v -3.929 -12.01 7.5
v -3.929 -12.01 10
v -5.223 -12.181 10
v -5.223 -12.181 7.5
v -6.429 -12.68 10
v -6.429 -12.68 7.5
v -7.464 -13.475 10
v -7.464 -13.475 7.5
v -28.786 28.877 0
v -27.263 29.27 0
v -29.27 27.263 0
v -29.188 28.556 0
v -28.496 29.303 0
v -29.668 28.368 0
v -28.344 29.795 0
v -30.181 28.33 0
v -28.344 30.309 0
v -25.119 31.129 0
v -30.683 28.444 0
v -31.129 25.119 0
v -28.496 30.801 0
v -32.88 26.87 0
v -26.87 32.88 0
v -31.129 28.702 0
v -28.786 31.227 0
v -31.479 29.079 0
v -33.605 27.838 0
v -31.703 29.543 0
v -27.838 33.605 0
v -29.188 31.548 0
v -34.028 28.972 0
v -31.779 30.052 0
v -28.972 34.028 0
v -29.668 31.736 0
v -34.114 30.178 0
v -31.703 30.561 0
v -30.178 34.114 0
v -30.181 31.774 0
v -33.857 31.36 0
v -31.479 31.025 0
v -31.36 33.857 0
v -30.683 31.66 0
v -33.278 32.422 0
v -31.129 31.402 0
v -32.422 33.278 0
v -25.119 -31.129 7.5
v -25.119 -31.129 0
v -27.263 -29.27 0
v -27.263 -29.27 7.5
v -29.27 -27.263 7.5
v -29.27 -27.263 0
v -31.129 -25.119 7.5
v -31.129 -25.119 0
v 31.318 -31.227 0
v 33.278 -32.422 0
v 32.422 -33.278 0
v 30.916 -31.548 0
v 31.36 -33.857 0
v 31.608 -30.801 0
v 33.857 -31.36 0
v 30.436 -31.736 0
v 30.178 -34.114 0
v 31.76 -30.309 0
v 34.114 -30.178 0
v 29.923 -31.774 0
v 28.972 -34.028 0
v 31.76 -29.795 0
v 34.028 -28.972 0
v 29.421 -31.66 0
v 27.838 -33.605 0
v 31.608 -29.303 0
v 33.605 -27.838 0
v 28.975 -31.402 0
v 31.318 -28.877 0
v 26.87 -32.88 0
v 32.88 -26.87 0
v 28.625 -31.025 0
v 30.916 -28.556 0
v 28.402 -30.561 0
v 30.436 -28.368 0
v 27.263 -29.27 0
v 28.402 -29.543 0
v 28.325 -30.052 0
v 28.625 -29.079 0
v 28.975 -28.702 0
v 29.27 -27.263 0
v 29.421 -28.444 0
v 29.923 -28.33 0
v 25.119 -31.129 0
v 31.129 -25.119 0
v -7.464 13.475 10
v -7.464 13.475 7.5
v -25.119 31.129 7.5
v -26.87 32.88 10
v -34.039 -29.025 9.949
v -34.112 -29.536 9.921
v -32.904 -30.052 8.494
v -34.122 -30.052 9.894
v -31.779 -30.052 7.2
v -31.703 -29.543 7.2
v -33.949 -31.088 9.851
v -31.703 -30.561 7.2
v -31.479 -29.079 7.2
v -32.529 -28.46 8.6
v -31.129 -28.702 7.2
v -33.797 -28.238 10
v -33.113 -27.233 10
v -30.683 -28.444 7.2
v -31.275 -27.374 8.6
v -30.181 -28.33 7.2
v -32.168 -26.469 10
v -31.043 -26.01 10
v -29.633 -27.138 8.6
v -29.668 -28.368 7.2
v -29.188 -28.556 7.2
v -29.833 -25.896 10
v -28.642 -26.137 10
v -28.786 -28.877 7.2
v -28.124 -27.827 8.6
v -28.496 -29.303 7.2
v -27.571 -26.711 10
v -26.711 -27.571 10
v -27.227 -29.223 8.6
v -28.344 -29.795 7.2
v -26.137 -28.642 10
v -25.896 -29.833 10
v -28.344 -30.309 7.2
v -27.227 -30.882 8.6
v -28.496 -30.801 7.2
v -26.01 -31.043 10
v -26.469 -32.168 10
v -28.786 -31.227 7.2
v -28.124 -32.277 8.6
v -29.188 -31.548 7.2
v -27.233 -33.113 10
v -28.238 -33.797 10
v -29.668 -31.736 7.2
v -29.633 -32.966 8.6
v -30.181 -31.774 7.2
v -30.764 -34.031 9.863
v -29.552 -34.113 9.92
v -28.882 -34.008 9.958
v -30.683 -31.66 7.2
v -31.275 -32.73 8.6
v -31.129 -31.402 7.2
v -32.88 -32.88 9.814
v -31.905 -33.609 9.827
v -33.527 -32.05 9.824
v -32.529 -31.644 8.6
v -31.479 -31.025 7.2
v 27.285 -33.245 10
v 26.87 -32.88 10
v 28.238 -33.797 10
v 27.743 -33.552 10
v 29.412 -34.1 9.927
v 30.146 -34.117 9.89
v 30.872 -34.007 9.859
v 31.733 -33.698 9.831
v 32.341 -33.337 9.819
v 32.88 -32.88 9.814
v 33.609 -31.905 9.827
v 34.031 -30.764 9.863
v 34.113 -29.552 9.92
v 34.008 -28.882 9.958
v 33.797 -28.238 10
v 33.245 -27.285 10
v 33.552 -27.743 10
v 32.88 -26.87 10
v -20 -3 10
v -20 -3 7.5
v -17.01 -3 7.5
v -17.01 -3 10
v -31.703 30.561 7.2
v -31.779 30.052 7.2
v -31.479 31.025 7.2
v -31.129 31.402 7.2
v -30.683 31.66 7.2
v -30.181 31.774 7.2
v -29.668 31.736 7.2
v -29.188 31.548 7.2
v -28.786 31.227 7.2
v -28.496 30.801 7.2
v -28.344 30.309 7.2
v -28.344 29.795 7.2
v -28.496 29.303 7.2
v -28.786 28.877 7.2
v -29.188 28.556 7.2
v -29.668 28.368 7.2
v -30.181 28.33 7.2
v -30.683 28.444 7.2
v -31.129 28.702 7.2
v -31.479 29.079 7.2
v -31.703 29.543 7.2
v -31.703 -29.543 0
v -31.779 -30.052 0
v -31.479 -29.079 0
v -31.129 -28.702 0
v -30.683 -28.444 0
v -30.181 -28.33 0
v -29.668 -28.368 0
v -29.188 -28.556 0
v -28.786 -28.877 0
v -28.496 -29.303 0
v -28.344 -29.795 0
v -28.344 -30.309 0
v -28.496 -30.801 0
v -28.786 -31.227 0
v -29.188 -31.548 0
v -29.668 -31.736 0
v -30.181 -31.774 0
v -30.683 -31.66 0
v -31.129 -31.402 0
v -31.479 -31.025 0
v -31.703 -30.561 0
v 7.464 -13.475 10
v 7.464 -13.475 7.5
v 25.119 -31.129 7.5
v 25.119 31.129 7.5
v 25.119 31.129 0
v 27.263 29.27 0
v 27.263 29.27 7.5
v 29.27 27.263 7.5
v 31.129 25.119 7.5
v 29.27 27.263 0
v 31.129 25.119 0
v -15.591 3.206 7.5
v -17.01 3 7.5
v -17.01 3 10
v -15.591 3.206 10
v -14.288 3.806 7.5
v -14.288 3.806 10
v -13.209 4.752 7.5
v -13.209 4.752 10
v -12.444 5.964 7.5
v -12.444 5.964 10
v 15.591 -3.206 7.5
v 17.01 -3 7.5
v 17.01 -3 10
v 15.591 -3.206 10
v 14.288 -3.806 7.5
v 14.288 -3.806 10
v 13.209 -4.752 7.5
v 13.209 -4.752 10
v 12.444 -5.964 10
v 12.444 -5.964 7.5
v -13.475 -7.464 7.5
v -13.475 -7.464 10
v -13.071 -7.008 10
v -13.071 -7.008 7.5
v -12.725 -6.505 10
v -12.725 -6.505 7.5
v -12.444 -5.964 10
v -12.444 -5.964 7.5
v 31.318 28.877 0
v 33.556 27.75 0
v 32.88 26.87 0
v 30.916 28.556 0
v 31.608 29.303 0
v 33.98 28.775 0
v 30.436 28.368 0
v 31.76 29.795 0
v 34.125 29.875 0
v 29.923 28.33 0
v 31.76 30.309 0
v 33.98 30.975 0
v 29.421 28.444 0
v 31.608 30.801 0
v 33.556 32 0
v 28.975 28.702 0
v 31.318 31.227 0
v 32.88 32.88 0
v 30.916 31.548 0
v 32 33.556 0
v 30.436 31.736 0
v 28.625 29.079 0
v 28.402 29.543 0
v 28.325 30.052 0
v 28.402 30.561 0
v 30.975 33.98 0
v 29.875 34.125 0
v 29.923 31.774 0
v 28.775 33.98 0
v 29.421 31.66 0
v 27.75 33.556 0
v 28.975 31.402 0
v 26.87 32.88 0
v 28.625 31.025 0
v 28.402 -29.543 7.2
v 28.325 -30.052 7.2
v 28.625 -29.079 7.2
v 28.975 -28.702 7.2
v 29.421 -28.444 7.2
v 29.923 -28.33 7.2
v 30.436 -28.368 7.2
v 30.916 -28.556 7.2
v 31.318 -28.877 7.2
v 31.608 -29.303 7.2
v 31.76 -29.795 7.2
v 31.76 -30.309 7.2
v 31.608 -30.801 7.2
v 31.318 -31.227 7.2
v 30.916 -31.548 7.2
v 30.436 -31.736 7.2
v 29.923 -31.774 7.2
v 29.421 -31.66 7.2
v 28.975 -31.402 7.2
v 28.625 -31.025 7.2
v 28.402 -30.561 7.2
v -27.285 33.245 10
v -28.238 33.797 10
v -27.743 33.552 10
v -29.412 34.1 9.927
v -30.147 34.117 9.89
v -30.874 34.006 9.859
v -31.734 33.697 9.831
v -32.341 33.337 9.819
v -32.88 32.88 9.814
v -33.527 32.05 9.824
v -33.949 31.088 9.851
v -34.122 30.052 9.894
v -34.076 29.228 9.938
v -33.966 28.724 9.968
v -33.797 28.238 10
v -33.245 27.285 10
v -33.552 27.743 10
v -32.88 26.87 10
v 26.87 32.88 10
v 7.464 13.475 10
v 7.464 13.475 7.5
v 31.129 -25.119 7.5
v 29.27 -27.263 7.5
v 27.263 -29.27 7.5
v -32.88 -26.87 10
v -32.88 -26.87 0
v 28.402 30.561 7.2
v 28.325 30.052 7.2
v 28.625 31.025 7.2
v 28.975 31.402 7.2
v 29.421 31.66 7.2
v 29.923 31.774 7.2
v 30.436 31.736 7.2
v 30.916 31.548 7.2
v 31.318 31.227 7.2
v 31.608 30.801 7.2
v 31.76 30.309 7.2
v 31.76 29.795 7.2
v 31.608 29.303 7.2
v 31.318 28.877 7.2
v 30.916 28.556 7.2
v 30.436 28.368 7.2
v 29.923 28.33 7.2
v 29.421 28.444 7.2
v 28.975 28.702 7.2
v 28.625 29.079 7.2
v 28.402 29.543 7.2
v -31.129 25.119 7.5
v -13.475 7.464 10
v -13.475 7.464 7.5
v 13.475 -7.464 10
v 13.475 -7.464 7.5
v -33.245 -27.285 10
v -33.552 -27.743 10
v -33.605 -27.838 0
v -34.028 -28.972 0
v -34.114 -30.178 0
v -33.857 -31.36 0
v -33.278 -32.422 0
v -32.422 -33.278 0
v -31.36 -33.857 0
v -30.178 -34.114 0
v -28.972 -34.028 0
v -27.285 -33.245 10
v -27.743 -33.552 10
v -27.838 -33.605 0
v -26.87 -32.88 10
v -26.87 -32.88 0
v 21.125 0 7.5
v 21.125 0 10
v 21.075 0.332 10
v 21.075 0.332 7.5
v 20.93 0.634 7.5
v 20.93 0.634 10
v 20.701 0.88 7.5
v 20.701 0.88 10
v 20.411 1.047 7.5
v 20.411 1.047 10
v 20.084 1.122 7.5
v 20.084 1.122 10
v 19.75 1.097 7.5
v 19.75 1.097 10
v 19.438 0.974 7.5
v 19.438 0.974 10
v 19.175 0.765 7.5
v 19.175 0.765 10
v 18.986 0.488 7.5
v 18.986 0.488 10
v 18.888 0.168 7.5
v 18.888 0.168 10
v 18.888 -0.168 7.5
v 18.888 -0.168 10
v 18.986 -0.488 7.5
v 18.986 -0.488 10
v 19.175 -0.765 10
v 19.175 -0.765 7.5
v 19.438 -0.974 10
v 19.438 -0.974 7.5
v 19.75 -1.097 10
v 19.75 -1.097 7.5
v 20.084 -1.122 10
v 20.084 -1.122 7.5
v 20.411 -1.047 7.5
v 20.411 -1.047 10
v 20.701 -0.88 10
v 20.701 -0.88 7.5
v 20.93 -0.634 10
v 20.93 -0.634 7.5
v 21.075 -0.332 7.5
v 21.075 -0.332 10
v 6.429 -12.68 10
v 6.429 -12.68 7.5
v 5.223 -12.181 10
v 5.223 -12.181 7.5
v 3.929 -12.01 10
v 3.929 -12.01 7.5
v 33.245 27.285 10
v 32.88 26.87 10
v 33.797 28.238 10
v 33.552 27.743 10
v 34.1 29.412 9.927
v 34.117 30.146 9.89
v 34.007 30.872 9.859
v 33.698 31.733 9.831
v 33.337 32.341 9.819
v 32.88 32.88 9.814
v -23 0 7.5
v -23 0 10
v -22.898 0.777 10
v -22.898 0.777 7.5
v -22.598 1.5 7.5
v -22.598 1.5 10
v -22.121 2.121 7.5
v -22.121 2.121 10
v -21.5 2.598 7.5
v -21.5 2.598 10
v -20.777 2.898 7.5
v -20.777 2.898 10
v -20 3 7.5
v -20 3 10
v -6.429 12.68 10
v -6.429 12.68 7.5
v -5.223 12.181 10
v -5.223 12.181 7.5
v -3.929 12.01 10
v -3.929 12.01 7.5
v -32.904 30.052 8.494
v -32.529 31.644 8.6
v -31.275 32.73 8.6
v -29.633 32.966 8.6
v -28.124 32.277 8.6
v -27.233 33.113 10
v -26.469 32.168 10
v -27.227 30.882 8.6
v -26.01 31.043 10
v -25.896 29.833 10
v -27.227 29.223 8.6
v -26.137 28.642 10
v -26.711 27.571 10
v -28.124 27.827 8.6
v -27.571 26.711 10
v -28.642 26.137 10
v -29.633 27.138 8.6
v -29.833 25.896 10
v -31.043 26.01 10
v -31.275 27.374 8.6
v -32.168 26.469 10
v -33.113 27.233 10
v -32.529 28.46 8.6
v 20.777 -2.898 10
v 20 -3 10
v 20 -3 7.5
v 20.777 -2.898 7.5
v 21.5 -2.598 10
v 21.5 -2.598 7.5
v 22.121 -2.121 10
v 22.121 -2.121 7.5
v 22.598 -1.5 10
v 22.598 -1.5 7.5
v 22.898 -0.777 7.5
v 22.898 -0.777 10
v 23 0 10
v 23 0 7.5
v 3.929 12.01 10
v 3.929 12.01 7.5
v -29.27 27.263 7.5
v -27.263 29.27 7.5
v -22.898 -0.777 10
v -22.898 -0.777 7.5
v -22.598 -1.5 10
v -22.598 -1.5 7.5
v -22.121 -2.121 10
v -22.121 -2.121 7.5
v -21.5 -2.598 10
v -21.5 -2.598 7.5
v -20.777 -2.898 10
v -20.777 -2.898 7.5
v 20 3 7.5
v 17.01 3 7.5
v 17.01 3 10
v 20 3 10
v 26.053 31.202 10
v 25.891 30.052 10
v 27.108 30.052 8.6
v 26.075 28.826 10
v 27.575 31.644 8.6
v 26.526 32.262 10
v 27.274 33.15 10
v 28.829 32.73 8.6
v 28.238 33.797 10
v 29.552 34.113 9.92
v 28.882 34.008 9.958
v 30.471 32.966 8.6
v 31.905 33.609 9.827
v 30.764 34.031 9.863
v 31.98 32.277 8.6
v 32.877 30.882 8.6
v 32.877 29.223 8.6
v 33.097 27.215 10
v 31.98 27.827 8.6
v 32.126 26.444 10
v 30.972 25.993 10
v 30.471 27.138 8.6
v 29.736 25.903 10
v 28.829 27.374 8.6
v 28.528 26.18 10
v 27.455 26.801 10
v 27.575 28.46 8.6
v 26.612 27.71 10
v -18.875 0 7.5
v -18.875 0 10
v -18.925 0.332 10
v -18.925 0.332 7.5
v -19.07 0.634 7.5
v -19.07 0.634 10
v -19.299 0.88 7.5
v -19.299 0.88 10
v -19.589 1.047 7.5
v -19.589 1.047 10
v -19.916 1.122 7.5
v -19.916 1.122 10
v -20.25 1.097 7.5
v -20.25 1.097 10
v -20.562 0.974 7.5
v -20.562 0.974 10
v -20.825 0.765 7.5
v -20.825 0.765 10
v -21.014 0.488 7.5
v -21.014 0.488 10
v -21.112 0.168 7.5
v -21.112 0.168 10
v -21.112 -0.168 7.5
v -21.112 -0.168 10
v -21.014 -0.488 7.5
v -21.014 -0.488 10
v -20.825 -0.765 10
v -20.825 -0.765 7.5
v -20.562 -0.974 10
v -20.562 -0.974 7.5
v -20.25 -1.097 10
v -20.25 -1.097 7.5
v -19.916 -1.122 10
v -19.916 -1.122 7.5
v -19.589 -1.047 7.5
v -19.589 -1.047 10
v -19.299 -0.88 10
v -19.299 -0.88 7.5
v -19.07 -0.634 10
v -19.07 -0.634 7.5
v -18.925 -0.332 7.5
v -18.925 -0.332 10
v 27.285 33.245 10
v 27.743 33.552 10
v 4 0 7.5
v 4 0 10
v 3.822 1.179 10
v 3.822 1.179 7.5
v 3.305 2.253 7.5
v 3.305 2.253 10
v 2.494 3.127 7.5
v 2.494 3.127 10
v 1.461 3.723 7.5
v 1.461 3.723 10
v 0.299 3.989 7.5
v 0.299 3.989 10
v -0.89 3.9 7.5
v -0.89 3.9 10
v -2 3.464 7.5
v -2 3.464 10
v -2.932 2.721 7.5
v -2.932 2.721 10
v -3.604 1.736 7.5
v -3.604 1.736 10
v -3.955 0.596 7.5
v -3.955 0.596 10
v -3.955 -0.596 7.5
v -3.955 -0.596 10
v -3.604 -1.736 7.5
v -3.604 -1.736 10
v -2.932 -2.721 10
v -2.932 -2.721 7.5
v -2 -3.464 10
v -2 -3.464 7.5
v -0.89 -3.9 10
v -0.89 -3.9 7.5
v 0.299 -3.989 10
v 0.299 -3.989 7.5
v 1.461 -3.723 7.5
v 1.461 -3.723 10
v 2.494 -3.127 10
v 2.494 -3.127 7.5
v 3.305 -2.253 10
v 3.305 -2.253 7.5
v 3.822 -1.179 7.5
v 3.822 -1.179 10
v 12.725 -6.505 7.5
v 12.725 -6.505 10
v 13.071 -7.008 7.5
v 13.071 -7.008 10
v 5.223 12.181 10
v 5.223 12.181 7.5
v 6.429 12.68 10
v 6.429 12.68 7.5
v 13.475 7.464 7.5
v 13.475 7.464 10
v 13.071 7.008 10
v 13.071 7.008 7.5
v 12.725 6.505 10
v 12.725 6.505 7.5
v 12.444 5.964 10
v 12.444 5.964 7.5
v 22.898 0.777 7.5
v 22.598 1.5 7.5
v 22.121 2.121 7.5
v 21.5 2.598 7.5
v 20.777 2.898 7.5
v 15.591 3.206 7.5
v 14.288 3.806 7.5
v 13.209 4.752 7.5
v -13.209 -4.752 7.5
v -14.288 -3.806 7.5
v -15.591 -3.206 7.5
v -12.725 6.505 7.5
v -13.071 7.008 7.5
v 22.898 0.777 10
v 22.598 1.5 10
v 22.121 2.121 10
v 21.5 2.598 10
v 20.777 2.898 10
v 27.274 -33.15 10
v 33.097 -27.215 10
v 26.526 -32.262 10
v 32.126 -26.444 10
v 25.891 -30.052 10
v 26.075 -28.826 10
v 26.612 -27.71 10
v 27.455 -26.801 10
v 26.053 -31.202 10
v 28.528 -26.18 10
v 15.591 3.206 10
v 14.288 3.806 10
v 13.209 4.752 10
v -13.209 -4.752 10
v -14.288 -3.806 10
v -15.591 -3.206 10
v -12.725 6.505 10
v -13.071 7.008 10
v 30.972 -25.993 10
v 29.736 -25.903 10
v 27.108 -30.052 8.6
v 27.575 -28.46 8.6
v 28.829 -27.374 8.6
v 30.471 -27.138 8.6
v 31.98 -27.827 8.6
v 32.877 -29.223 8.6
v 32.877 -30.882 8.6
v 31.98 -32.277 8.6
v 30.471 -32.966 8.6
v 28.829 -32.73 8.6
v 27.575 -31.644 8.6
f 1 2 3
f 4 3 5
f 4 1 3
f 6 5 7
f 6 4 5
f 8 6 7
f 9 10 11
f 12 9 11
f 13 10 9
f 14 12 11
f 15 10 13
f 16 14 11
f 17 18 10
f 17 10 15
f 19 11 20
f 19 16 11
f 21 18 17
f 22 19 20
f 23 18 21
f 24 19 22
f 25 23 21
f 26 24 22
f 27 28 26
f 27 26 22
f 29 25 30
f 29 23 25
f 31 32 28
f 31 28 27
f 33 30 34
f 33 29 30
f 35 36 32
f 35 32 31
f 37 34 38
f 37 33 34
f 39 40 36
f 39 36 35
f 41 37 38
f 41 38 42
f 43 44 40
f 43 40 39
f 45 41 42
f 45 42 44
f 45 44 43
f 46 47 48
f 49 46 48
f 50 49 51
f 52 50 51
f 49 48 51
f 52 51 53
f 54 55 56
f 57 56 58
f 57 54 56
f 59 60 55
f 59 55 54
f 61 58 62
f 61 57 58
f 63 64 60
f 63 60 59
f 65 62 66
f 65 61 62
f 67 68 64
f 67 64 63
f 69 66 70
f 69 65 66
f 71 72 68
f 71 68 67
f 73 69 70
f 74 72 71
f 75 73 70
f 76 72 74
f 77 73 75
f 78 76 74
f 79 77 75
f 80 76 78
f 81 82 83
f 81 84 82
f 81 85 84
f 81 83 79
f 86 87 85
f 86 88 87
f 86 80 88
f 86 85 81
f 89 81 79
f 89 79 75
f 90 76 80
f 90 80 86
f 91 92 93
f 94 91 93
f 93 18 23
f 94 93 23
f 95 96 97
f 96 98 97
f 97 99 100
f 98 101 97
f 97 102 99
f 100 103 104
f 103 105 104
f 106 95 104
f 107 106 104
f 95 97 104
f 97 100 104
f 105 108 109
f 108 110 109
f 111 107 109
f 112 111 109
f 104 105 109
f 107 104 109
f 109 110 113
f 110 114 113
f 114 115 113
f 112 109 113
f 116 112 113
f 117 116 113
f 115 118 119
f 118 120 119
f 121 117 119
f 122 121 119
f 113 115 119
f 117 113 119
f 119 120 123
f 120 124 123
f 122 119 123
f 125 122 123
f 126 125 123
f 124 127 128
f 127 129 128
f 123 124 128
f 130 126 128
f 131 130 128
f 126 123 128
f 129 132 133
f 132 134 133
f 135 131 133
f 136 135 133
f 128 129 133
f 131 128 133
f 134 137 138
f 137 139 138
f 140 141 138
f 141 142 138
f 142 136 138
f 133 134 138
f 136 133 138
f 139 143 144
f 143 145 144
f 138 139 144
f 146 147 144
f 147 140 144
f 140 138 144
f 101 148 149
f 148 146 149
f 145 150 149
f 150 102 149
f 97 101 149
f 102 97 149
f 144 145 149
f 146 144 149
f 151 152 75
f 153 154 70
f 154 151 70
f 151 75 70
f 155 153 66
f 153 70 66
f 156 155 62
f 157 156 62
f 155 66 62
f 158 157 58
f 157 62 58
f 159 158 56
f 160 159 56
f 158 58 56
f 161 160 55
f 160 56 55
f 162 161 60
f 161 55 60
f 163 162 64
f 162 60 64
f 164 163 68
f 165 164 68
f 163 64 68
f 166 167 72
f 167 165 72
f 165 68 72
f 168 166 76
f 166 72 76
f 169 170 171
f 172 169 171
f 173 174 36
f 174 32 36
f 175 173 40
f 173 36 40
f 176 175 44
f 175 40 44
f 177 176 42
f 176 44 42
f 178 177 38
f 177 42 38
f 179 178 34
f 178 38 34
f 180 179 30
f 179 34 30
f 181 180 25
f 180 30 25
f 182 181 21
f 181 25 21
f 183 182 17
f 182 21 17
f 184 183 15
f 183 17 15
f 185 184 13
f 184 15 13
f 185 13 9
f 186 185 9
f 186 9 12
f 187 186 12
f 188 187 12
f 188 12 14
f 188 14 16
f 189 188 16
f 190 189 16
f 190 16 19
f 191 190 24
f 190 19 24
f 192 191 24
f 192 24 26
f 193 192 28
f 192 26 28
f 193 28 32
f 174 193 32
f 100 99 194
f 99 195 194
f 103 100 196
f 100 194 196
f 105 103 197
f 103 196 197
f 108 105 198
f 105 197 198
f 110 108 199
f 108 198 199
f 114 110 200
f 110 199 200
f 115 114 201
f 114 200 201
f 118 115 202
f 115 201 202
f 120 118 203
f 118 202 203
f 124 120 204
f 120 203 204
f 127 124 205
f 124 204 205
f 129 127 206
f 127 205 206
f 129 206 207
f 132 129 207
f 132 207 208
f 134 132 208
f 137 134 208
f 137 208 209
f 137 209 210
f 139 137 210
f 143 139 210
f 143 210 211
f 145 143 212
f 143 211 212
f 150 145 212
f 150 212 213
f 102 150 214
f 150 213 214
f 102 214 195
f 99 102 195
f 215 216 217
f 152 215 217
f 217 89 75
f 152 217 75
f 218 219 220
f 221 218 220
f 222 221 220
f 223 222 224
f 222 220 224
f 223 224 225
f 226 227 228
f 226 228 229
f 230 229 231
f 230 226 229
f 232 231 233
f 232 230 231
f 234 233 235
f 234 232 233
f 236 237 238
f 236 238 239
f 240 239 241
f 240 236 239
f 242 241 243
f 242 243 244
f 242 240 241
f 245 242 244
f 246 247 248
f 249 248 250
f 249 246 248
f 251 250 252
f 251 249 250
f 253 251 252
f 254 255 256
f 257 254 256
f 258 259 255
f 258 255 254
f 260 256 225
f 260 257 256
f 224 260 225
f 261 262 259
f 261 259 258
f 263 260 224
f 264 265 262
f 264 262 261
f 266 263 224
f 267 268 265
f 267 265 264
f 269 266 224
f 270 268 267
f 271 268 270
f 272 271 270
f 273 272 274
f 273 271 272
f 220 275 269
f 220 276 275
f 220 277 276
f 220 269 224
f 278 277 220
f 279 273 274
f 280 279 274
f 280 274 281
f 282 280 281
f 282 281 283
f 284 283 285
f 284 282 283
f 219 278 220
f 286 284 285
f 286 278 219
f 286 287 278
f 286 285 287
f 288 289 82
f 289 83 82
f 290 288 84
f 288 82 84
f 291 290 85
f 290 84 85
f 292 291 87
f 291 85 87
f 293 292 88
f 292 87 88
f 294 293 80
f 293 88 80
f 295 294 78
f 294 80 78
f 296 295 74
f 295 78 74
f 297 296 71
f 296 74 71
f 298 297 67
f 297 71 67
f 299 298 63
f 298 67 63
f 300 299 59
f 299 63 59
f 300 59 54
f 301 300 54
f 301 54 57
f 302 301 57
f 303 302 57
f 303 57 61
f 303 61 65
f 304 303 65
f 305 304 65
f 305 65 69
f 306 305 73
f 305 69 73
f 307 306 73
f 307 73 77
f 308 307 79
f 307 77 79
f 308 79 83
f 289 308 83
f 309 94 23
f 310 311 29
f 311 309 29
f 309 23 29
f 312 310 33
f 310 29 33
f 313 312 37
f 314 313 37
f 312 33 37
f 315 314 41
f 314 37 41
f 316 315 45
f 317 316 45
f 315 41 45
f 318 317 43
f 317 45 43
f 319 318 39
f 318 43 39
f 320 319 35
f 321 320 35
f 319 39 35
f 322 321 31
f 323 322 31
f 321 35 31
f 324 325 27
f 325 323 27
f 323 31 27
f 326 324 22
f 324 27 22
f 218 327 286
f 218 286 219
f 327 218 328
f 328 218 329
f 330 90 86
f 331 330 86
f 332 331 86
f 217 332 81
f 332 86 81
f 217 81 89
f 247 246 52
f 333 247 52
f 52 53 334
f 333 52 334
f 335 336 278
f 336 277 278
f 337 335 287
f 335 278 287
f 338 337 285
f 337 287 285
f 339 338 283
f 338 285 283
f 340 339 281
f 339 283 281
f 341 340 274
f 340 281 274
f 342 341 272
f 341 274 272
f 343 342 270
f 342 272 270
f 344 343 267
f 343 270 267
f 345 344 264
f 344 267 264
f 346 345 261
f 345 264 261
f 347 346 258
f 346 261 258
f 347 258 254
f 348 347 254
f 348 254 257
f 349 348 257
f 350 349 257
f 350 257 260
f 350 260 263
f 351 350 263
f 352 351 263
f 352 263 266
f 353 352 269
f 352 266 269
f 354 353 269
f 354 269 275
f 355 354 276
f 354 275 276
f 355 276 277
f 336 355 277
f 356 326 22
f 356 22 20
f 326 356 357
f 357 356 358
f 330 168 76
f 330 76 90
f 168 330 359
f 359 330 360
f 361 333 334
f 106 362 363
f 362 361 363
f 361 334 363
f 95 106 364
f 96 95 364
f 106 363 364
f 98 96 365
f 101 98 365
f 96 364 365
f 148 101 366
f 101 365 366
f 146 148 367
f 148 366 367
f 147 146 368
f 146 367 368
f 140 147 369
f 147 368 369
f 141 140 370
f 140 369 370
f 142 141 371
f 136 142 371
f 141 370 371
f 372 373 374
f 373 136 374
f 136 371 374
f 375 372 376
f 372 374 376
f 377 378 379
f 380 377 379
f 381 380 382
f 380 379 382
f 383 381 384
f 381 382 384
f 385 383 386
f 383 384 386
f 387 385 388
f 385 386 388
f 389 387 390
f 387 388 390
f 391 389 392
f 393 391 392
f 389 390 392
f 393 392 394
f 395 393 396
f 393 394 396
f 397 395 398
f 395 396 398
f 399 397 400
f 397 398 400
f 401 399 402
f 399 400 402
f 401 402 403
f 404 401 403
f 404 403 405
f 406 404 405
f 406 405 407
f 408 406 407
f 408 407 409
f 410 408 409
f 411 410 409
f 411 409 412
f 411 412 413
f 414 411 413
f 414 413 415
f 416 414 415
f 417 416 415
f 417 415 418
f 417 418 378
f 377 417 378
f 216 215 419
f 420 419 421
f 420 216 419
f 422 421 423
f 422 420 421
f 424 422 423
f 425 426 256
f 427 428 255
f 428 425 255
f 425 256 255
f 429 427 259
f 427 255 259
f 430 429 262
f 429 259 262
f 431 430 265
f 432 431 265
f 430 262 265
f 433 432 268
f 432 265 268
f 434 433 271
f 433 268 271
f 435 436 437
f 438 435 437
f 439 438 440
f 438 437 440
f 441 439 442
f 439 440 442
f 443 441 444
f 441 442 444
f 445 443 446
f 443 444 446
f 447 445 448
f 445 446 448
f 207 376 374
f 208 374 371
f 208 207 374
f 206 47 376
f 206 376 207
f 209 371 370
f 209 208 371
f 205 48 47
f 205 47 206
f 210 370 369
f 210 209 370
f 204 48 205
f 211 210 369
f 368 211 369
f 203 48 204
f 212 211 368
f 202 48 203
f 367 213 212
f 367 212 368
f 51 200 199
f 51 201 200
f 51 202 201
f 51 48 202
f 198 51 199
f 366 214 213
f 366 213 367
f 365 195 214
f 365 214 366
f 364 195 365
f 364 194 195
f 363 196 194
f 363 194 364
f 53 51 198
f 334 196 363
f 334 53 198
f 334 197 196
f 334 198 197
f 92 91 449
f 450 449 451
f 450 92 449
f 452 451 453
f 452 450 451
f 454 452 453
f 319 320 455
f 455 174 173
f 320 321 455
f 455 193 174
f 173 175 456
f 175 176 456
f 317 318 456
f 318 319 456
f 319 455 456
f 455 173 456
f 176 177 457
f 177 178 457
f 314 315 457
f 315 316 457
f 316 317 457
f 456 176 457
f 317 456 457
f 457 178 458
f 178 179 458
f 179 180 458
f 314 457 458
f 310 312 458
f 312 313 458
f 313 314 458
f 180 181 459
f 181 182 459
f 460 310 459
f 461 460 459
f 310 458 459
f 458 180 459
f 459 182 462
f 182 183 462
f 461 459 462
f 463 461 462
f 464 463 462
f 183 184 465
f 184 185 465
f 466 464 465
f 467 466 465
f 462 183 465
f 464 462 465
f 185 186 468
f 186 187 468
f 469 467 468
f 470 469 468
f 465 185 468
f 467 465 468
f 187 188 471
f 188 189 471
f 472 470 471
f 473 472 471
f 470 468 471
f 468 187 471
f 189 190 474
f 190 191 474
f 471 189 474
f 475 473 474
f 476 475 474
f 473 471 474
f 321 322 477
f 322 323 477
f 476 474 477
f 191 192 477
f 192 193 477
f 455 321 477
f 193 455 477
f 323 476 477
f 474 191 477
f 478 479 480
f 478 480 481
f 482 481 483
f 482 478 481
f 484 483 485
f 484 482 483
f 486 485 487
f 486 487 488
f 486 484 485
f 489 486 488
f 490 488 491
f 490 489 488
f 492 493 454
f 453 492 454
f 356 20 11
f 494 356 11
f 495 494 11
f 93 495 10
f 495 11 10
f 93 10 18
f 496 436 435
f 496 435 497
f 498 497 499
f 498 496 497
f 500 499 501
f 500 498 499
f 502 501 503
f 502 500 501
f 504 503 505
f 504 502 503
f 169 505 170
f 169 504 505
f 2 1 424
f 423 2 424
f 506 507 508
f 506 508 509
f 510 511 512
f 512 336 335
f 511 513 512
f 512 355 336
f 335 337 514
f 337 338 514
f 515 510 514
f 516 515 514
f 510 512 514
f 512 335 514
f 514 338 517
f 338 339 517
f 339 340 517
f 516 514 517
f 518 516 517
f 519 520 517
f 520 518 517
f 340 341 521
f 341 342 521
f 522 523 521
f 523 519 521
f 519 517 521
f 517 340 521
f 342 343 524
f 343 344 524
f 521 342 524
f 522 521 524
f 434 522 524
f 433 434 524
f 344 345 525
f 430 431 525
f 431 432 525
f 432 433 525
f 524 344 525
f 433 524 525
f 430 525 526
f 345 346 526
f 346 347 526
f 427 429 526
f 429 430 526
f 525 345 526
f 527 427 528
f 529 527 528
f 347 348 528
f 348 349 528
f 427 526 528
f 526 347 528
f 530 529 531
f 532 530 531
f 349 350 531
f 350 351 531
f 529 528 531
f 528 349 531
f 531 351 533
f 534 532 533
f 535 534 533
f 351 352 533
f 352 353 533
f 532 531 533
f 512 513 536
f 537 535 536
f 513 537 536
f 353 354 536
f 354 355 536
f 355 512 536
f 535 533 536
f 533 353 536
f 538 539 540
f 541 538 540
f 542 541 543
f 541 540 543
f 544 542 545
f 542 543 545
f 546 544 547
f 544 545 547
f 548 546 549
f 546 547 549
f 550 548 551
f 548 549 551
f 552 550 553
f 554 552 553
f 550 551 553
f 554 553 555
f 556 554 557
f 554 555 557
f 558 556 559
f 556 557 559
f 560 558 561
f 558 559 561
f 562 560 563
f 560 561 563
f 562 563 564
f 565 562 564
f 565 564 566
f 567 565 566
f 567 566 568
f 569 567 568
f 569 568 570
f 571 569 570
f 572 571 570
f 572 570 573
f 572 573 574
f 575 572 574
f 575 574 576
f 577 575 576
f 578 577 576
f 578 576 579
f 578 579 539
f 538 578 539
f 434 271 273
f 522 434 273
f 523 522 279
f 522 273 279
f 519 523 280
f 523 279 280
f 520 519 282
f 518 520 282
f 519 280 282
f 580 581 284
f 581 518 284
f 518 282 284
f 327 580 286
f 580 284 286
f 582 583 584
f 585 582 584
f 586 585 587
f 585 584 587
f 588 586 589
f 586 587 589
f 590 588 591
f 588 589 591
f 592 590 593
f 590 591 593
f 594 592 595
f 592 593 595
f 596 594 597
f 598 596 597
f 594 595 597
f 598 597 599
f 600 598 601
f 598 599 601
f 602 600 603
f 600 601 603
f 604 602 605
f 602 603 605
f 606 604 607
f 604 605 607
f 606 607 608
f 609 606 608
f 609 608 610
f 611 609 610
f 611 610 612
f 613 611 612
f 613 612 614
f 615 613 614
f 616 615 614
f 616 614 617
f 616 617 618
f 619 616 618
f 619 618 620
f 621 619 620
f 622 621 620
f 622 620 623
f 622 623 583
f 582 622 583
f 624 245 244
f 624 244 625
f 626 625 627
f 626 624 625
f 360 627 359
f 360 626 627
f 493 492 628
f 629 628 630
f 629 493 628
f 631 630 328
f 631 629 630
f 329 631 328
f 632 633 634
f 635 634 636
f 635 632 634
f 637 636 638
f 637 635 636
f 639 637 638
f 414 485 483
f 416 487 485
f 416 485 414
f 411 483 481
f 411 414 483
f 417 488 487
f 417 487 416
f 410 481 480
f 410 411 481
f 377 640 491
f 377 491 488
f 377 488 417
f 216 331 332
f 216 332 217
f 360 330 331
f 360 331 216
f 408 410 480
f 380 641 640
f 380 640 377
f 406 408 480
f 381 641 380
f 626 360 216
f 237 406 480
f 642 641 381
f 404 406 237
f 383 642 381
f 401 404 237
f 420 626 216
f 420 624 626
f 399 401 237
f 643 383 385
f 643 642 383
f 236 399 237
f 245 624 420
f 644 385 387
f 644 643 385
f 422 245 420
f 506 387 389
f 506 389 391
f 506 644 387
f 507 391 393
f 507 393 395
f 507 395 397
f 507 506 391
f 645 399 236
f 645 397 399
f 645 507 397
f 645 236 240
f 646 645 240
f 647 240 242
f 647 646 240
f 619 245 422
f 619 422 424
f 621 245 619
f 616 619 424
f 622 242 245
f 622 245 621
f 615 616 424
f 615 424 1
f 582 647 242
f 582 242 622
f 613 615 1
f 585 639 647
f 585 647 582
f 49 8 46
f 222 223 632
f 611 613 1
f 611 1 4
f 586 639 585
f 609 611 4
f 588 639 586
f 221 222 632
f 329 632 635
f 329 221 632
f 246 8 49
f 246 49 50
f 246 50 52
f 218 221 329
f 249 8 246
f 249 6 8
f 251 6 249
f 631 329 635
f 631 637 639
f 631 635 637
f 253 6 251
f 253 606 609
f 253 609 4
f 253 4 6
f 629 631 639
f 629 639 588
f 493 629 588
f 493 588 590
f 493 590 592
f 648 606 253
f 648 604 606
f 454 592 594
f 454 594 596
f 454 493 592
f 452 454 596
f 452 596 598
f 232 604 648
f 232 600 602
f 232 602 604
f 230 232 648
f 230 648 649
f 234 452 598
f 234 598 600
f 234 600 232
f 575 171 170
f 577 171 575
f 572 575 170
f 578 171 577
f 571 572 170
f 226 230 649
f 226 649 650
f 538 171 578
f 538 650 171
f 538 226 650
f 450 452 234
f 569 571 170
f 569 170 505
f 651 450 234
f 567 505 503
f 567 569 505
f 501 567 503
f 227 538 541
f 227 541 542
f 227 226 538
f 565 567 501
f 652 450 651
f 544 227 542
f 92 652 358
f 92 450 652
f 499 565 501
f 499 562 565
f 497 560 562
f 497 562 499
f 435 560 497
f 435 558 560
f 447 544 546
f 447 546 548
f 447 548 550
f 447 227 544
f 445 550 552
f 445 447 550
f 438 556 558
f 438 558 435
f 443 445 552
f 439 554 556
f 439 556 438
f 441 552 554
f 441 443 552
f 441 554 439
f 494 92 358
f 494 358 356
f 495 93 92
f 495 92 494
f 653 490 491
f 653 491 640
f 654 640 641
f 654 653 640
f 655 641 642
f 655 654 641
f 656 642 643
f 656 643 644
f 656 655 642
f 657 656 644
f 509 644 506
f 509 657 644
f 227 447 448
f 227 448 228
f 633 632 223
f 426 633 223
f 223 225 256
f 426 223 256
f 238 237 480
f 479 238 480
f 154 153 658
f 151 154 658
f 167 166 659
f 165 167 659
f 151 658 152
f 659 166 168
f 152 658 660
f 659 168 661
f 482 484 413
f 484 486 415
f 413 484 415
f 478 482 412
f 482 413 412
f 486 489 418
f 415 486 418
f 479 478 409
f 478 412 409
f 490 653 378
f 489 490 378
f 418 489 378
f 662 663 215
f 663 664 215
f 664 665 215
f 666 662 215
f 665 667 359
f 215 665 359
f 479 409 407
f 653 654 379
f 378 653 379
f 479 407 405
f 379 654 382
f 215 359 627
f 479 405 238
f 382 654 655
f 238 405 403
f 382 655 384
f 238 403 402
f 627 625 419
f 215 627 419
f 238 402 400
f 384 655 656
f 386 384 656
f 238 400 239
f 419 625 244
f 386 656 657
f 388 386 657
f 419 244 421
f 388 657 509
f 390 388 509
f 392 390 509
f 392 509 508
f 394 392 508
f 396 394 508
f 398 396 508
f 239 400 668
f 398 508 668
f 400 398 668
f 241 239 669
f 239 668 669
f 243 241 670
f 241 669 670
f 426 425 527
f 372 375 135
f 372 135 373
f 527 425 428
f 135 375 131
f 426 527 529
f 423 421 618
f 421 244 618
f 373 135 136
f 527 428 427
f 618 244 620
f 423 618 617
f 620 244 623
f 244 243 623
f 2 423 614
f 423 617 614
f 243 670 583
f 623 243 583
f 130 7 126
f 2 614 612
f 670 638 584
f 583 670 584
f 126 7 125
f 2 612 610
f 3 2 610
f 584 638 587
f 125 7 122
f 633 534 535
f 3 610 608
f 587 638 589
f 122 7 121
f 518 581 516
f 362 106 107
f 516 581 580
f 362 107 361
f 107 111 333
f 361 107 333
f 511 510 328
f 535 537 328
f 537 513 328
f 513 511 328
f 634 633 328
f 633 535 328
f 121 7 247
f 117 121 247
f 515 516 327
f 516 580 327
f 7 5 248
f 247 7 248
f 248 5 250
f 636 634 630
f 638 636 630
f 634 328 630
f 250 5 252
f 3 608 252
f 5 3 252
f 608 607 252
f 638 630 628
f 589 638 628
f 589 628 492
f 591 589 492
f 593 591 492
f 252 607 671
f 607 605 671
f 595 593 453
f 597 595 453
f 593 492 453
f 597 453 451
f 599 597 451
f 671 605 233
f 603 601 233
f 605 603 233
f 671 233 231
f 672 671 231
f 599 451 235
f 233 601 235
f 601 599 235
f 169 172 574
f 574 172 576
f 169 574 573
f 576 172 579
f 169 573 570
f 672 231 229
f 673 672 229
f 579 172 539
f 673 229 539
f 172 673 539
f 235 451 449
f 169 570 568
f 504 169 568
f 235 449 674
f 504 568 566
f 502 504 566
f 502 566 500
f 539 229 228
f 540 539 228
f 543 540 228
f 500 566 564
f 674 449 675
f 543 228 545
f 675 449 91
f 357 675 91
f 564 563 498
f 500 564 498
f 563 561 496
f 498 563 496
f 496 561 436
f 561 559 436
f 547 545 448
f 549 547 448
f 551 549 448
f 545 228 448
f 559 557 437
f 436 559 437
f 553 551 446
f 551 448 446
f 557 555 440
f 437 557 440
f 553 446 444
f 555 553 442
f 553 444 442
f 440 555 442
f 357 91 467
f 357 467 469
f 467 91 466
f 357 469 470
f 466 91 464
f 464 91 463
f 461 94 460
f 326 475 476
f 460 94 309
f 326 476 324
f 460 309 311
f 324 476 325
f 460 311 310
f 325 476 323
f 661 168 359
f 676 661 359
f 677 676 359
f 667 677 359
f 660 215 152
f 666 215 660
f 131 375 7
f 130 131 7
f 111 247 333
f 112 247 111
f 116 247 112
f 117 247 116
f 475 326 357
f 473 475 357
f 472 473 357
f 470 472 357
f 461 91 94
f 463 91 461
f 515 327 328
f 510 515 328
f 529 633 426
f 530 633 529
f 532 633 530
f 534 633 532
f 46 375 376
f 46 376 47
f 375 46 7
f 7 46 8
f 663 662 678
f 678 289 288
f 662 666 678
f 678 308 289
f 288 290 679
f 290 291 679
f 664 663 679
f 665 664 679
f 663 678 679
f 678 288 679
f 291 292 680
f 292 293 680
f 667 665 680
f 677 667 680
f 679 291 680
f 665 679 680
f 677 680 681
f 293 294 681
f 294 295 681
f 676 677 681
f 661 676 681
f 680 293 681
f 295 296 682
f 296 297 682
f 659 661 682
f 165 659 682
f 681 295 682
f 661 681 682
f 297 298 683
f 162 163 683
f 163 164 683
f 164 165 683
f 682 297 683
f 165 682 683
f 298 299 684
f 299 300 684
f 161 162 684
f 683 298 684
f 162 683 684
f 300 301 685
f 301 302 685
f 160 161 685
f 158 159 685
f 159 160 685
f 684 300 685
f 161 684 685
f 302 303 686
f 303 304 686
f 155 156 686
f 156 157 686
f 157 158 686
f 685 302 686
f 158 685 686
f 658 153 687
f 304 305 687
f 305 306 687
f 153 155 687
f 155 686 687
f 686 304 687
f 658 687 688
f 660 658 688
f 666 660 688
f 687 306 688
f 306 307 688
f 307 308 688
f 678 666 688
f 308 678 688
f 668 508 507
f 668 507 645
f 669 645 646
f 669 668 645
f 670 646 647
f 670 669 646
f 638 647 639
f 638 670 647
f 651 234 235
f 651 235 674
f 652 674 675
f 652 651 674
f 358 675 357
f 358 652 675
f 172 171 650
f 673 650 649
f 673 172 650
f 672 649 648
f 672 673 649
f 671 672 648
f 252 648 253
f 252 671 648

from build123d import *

# Parameters (mm, degrees)
BOSS_EXTRUDE1_DEPTH                            = 10
SKETCH3_W                                      = 46
SKETCH3_H                                      = 6
BOSS_EXTRUDE2_DEPTH                            = 10
CSK_FOR_4_OVAL_HEAD_MACHINE_SCREW1_D           = 3.4544
CSK_FOR_4_OVAL_HEAD_MACHINE_SCREW1_DEPTH       = 25
CSK_FOR_4_OVAL_HEAD_MACHINE_SCREW1_CSINK_D     = 8.3228434
CSK_FOR_4_OVAL_HEAD_MACHINE_SCREW1_CSINK_ANGLE = 82
CSK_FOR_4_OVAL_HEAD_MACHINE_SCREW1_TIP         = 1.037806461
SKETCH7_R                                      = 1.125
CUT_EXTRUDE1_DEPTH                             = 52.725839771
SKETCH8_R                                      = 4
CUT_EXTRUDE2_DEPTH                             = 52.725839771
FILLET1_R                                      = 4.25
FILLET2_R                                      = 3
FILLET3_R                                      = 5
SKETCH9_R                                      = 40
CUT_EXTRUDE3_DEPTH                             = 7.5


# Some blends are built 0.0001 mm under size
with BuildPart() as part:
    # Sketch2 → Boss-Extrude1 (new body)
    with BuildSketch(Plane.XY):
        Polygon((-6, 12.01040764), (-29.875261505, 35.885669145), (-35.885669145, 29.875261505), (-12.01040764, 6), (-12.01040764, -6), (-35.885669145, -29.875261505), (-29.875261505, -35.885669145), (-6, -12.01040764), (6, -12.01040764), (29.875261505, -35.885669145), (35.885669145, -29.875261505), (12.01040764, -6), (12.01040764, 6), (35.885669145, 29.875261505), (29.875261505, 35.885669145), (6, 12.01040764), align=None)
    extrude(amount=BOSS_EXTRUDE1_DEPTH)

    # Sketch3 → Boss-Extrude2 (add)
    with BuildSketch(Plane.XY):
        Rectangle(SKETCH3_W, SKETCH3_H)
    extrude(amount=BOSS_EXTRUDE2_DEPTH)

    # CSK for #4 Oval Head Machine Screw1
    with Locations(Plane.XY.offset(10)):
        with Locations((-30.0520382, 30.0520382), (30.0520382, 30.0520382), (30.0520382, -30.0520382), (-30.0520382, -30.0520382)):
            CounterSinkHole(CSK_FOR_4_OVAL_HEAD_MACHINE_SCREW1_D / 2, CSK_FOR_4_OVAL_HEAD_MACHINE_SCREW1_CSINK_D / 2, depth=CSK_FOR_4_OVAL_HEAD_MACHINE_SCREW1_DEPTH, counter_sink_angle=CSK_FOR_4_OVAL_HEAD_MACHINE_SCREW1_CSINK_ANGLE)
            with Locations((0, 0, -(CSK_FOR_4_OVAL_HEAD_MACHINE_SCREW1_DEPTH + CSK_FOR_4_OVAL_HEAD_MACHINE_SCREW1_TIP / 2))):  # 118° drill point
                Cone(0, CSK_FOR_4_OVAL_HEAD_MACHINE_SCREW1_D / 2, CSK_FOR_4_OVAL_HEAD_MACHINE_SCREW1_TIP, mode=Mode.SUBTRACT)

    # Sketch7 → Cut-Extrude1 (cut, through all)
    with BuildSketch(Plane.XY.offset(10)):
        with Locations((20, 0)):
            Circle(SKETCH7_R)
        with Locations((-20, 0)):
            Circle(SKETCH7_R)
    extrude(amount=-CUT_EXTRUDE1_DEPTH, mode=Mode.SUBTRACT)

    # Sketch8 → Cut-Extrude2 (cut, through all)
    with BuildSketch(Plane.XY.offset(10)):
        Circle(SKETCH8_R)
    extrude(amount=-CUT_EXTRUDE2_DEPTH, mode=Mode.SUBTRACT)

    # Fillet1
    # the kernel refuses this fillet: 4.25 mm, written as the material it takes off along each edge
    with BuildSketch(Plane(origin=(35.885669145, -29.875261505, -10.625), x_dir=(-0.7071067811865225, 0.7071067811865727, 0), z_dir=(0, 0, 1)), Plane(origin=(29.875261505, -35.885669145, -10.625), x_dir=(0.7071067811865693, 0.7071067811865258, 0), z_dir=(0, 0, 1)), Plane(origin=(29.875261505, 35.885669145, -10.625), x_dir=(-0.7071067811865508, -0.7071067811865441, 0), z_dir=(0, 0, 1)), Plane(origin=(35.885669145, 29.875261505, -10.625), x_dir=(-0.7071067811889081, 0.7071067811841868, 0), z_dir=(0, 0, 1))) as fillet1_piece_1:
        with BuildLine():
            CenterArc((FILLET1_R, FILLET1_R), FILLET1_R, 180, 90)
            Line((0, FILLET1_R), (0, 0))
            Line((0, 0), (FILLET1_R, 0))
        make_face()
    extrude(amount=31.25, mode=Mode.SUBTRACT)
    with BuildSketch(Plane(origin=(-29.875261505, 35.885669145, -10.625), x_dir=(0.7071067811862382, -0.7071067811868568, 0), z_dir=(0, 0, 1)), Plane(origin=(-35.885669145, 29.875261505, -10.625), x_dir=(0.7071067811865512, 0.7071067811865438, 0), z_dir=(0, 0, 1)), Plane(origin=(-35.885669145, -29.875261505, -10.625), x_dir=(0.7071067811865503, 0.7071067811865446, 0), z_dir=(0, 0, 1)), Plane(origin=(-29.875261505, -35.885669145, -10.625), x_dir=(-0.7071067811865447, 0.7071067811865505, 0), z_dir=(0, 0, 1))) as fillet1_piece_2:
        with BuildLine():
            CenterArc((FILLET1_R, -FILLET1_R), FILLET1_R, 90, 90)
            Line((0, -FILLET1_R), (0, 0))
            Line((0, 0), (FILLET1_R, 0))
        make_face()
    extrude(amount=31.25, mode=Mode.SUBTRACT)

    # Fillet2
    fillet2_edges = [part.edges().sort_by_distance(p)[0] for p in [
        (23, 3, 5),
        (23, -3, 5),
        (-23, 3, 5),
        (-23, -3, 5),
    ]]
    fillet(fillet2_edges, radius=FILLET2_R - 0.0001)  # a hair under: the kernel refuses the full size

    # Fillet3
    # the kernel refuses this fillet: 5 mm, written as the material it adds along each edge
    with BuildSketch(Plane(origin=(-6, 12.01040764, 0), x_dir=(1, 0, 0), z_dir=(0, 0, 1)), Plane(origin=(6, 12.01040764, 0), x_dir=(0.7071067811865509, 0.707106781186544, 0), z_dir=(0, 0, 1)), Plane(origin=(-12.01040764, 6, 0), x_dir=(-0.7071067811865444, 0.7071067811865508, 0), z_dir=(0, 0, 1)), Plane(origin=(12.01040764, 6, 0), x_dir=(0, -1, 0), z_dir=(0, 0, 1))) as fillet3_piece_1:
        with BuildLine():
            CenterArc((FILLET3_R * 0.414213562373, FILLET3_R), FILLET3_R, 225, 45)
            Line((-FILLET3_R * 0.292893218814, FILLET3_R * 0.292893218814), (0, 0))
            Line((0, 0), (FILLET3_R * 0.414213562373, 0))
        make_face()
    extrude(amount=10)
    with BuildSketch(Plane(origin=(-12.01040764, 3, 0), x_dir=(0, 1, 0), z_dir=(0, 0, 1)), Plane(origin=(-12.01040764, -3, 10), x_dir=(0, -1, 0), z_dir=(0, 0, -1))) as fillet3_piece_2:
        with BuildLine():
            CenterArc((FILLET3_R, FILLET3_R), FILLET3_R, 180, 90)
            Line((0, FILLET3_R), (0, 0))
            Line((0, 0), (FILLET3_R, 0))
        make_face()
    extrude(amount=10)
    with BuildSketch(Plane(origin=(-12.01040764, -6, 0), x_dir=(-0.7071067811865506, -0.7071067811865446, 0), z_dir=(0, 0, 1)), Plane(origin=(-6, -12.01040764, 0), x_dir=(1, 0, 0), z_dir=(0, 0, 1)), Plane(origin=(6, -12.01040764, 0), x_dir=(0.7071067811861392, -0.7071067811869558, 0), z_dir=(0, 0, 1)), Plane(origin=(12.01040764, -6, 0), x_dir=(0, 1, 0), z_dir=(0, 0, 1))) as fillet3_piece_3:
        with BuildLine():
            CenterArc((FILLET3_R * 0.414213562373, -FILLET3_R), FILLET3_R, 90, 45)
            Line((-FILLET3_R * 0.292893218813, -FILLET3_R * 0.292893218813), (0, 0))
            Line((0, 0), (FILLET3_R * 0.414213562373, 0))
        make_face()
    extrude(amount=10)
    with BuildSketch(Plane(origin=(12.01040764, -3, 0), x_dir=(1, 0, 0), z_dir=(0, 0, 1)), Plane(origin=(12.01040764, 3, 10), x_dir=(1, 0, 0), z_dir=(0, 0, -1))) as fillet3_piece_4:
        with BuildLine():
            CenterArc((FILLET3_R, -FILLET3_R), FILLET3_R, 90, 90)
            Line((0, -FILLET3_R), (0, 0))
            Line((0, 0), (FILLET3_R, 0))
        make_face()
    extrude(amount=10)

    # Sketch9 → Cut-Extrude3 (cut)
    with BuildSketch(Plane(origin=(0, 0, 0), x_dir=(-1, 0, 0), z_dir=(0, 0, -1))):
        Circle(SKETCH9_R)
    extrude(amount=-CUT_EXTRUDE3_DEPTH, mode=Mode.SUBTRACT)


solid = part.part
